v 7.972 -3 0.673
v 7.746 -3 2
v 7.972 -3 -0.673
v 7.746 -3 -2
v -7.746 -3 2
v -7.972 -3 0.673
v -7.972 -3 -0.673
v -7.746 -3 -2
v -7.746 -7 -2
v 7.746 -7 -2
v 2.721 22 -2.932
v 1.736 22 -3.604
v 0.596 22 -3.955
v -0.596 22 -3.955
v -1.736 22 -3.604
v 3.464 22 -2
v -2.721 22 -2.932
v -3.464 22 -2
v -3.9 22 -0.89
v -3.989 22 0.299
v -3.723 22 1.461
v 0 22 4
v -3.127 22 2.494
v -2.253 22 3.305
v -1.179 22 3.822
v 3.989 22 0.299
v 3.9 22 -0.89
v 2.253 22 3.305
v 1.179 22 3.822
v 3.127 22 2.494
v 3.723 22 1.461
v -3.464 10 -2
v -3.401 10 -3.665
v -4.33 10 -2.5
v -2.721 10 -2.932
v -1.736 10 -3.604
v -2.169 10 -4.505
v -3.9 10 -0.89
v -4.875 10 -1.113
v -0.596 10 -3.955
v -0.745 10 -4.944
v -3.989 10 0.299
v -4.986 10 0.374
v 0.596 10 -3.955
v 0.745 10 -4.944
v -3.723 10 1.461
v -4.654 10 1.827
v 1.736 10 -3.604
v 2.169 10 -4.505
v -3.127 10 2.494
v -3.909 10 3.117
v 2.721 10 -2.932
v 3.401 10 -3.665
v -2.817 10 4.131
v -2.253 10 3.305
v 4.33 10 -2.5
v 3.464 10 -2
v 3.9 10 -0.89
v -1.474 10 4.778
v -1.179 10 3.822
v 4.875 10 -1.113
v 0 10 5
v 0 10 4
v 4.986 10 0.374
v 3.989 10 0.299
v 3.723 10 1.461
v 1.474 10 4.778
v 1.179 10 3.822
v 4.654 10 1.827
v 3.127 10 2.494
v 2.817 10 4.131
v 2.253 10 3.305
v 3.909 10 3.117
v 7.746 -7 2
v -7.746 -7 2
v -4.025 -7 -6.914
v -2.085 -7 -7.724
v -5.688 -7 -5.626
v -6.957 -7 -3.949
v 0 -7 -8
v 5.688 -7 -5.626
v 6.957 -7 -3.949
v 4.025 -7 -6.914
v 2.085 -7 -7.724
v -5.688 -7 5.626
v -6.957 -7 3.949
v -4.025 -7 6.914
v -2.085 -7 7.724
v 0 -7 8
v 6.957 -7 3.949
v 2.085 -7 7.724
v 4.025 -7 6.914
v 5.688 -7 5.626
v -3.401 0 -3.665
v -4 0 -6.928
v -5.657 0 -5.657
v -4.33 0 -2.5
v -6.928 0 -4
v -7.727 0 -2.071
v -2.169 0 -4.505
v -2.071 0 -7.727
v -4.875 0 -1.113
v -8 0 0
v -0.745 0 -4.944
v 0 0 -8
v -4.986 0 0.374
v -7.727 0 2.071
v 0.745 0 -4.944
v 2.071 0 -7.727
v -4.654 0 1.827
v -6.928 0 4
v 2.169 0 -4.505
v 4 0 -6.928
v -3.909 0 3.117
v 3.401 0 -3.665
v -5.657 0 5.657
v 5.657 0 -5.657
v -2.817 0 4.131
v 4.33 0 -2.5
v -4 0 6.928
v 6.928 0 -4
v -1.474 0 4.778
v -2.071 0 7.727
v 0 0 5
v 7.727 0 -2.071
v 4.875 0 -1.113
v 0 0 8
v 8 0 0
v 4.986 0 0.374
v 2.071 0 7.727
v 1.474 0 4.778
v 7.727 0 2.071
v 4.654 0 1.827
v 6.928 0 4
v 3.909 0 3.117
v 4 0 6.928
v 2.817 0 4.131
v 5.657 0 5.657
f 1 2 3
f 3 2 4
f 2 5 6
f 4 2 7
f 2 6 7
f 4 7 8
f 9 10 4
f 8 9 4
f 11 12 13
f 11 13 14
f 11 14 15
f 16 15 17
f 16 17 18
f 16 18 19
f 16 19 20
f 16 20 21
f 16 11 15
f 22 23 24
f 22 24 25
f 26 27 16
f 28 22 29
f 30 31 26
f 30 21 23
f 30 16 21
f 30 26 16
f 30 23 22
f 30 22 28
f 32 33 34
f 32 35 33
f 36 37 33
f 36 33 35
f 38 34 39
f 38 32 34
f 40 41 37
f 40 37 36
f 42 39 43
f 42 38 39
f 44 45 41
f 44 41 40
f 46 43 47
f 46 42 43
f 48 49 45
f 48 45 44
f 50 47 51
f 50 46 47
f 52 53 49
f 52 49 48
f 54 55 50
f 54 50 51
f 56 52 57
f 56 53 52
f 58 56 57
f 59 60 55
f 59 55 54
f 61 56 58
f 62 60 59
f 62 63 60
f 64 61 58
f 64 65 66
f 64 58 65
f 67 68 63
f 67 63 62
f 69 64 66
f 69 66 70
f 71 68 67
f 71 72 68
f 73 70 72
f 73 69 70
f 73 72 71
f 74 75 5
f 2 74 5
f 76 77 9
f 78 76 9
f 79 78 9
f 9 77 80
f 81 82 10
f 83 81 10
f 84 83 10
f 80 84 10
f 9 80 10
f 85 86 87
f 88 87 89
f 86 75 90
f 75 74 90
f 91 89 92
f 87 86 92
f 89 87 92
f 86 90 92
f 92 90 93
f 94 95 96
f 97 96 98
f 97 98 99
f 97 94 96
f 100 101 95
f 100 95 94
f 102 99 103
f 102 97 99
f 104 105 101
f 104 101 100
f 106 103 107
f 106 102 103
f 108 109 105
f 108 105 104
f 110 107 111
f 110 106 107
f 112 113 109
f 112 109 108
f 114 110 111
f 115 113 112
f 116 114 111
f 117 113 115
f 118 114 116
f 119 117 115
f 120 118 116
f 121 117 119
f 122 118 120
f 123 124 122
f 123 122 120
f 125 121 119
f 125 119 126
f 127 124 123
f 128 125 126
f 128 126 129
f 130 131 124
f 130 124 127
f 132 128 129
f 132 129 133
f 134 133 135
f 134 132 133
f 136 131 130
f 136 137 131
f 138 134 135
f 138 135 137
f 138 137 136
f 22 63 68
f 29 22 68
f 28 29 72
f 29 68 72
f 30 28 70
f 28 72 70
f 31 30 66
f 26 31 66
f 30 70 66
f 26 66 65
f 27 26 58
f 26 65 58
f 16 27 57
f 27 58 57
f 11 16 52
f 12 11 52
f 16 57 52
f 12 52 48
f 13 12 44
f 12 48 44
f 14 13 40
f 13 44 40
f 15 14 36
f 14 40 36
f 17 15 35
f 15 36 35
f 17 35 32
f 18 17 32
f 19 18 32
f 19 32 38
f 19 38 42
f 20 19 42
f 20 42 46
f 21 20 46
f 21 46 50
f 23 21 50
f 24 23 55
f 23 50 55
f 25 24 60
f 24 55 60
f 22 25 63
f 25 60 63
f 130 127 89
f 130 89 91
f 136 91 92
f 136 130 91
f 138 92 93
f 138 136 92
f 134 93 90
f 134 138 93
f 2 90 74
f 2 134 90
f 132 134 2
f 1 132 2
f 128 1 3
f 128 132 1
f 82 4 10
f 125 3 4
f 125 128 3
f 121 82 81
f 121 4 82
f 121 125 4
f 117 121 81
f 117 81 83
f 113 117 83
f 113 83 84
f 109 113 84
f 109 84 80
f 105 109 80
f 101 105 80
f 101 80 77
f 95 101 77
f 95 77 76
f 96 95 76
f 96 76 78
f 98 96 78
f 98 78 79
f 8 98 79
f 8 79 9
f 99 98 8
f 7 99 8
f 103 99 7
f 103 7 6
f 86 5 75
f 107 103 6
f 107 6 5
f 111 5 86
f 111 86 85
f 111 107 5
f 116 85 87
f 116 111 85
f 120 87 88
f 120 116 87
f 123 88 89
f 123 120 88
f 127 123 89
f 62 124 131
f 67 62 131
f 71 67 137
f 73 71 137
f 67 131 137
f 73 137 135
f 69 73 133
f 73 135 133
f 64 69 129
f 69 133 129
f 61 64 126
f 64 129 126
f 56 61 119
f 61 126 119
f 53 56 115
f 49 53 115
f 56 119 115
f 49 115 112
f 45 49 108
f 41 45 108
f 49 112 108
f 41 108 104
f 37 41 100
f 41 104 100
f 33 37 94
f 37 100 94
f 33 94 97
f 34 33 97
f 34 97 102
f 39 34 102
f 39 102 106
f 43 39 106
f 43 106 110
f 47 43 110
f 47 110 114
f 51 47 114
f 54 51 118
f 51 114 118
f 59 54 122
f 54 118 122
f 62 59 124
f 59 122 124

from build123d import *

# Parameters (mm, degrees)
SKETCH1_R               = 8
BOSS_EXTRUDE1_DEPTH     = 7
SKETCH2_R               = 5
BOSS_EXTRUDE2_DEPTH     = 10
CUT_EXTRUDE1_DEPTH      = 10
CUT_EXTRUDE1_DEPTH_BACK = 10
SKETCH3_W               = 4
SKETCH3_H               = 4
SKETCH4_R               = 4
BOSS_EXTRUDE3_DEPTH     = 12


with BuildPart() as part:
    # Sketch1 → Boss-Extrude1 (new body)
    with BuildSketch(Plane(origin=(0, 0, 0), x_dir=(1, 0, 0), z_dir=(0, 1, 0))):
        Circle(SKETCH1_R)
    extrude(amount=-BOSS_EXTRUDE1_DEPTH)

    # Sketch2 → Boss-Extrude2 (add)
    with BuildSketch(Plane(origin=(0, 0, 0), x_dir=(1, 0, 0), z_dir=(0, 1, 0))):
        Circle(SKETCH2_R)
    extrude(amount=BOSS_EXTRUDE2_DEPTH)

    # Sketch3 → Cut-Extrude1 (cut, two sides: drawn at the far end of the back side and taken through both)
    with BuildSketch(Plane(origin=(0, 0, 0), x_dir=(0, 0, -1), z_dir=(1, 0, 0)).offset(-CUT_EXTRUDE1_DEPTH_BACK)):
        with Locations((0, -5)):
            Rectangle(SKETCH3_W, SKETCH3_H)
    extrude(amount=CUT_EXTRUDE1_DEPTH + CUT_EXTRUDE1_DEPTH_BACK, mode=Mode.SUBTRACT)

    # Sketch4 → Boss-Extrude3 (add)
    with BuildSketch(Plane(origin=(0, 10, 0), x_dir=(1, 0, 0), z_dir=(0, 1, 0))):
        Circle(SKETCH4_R)
    extrude(amount=BOSS_EXTRUDE3_DEPTH)


solid = part.part
